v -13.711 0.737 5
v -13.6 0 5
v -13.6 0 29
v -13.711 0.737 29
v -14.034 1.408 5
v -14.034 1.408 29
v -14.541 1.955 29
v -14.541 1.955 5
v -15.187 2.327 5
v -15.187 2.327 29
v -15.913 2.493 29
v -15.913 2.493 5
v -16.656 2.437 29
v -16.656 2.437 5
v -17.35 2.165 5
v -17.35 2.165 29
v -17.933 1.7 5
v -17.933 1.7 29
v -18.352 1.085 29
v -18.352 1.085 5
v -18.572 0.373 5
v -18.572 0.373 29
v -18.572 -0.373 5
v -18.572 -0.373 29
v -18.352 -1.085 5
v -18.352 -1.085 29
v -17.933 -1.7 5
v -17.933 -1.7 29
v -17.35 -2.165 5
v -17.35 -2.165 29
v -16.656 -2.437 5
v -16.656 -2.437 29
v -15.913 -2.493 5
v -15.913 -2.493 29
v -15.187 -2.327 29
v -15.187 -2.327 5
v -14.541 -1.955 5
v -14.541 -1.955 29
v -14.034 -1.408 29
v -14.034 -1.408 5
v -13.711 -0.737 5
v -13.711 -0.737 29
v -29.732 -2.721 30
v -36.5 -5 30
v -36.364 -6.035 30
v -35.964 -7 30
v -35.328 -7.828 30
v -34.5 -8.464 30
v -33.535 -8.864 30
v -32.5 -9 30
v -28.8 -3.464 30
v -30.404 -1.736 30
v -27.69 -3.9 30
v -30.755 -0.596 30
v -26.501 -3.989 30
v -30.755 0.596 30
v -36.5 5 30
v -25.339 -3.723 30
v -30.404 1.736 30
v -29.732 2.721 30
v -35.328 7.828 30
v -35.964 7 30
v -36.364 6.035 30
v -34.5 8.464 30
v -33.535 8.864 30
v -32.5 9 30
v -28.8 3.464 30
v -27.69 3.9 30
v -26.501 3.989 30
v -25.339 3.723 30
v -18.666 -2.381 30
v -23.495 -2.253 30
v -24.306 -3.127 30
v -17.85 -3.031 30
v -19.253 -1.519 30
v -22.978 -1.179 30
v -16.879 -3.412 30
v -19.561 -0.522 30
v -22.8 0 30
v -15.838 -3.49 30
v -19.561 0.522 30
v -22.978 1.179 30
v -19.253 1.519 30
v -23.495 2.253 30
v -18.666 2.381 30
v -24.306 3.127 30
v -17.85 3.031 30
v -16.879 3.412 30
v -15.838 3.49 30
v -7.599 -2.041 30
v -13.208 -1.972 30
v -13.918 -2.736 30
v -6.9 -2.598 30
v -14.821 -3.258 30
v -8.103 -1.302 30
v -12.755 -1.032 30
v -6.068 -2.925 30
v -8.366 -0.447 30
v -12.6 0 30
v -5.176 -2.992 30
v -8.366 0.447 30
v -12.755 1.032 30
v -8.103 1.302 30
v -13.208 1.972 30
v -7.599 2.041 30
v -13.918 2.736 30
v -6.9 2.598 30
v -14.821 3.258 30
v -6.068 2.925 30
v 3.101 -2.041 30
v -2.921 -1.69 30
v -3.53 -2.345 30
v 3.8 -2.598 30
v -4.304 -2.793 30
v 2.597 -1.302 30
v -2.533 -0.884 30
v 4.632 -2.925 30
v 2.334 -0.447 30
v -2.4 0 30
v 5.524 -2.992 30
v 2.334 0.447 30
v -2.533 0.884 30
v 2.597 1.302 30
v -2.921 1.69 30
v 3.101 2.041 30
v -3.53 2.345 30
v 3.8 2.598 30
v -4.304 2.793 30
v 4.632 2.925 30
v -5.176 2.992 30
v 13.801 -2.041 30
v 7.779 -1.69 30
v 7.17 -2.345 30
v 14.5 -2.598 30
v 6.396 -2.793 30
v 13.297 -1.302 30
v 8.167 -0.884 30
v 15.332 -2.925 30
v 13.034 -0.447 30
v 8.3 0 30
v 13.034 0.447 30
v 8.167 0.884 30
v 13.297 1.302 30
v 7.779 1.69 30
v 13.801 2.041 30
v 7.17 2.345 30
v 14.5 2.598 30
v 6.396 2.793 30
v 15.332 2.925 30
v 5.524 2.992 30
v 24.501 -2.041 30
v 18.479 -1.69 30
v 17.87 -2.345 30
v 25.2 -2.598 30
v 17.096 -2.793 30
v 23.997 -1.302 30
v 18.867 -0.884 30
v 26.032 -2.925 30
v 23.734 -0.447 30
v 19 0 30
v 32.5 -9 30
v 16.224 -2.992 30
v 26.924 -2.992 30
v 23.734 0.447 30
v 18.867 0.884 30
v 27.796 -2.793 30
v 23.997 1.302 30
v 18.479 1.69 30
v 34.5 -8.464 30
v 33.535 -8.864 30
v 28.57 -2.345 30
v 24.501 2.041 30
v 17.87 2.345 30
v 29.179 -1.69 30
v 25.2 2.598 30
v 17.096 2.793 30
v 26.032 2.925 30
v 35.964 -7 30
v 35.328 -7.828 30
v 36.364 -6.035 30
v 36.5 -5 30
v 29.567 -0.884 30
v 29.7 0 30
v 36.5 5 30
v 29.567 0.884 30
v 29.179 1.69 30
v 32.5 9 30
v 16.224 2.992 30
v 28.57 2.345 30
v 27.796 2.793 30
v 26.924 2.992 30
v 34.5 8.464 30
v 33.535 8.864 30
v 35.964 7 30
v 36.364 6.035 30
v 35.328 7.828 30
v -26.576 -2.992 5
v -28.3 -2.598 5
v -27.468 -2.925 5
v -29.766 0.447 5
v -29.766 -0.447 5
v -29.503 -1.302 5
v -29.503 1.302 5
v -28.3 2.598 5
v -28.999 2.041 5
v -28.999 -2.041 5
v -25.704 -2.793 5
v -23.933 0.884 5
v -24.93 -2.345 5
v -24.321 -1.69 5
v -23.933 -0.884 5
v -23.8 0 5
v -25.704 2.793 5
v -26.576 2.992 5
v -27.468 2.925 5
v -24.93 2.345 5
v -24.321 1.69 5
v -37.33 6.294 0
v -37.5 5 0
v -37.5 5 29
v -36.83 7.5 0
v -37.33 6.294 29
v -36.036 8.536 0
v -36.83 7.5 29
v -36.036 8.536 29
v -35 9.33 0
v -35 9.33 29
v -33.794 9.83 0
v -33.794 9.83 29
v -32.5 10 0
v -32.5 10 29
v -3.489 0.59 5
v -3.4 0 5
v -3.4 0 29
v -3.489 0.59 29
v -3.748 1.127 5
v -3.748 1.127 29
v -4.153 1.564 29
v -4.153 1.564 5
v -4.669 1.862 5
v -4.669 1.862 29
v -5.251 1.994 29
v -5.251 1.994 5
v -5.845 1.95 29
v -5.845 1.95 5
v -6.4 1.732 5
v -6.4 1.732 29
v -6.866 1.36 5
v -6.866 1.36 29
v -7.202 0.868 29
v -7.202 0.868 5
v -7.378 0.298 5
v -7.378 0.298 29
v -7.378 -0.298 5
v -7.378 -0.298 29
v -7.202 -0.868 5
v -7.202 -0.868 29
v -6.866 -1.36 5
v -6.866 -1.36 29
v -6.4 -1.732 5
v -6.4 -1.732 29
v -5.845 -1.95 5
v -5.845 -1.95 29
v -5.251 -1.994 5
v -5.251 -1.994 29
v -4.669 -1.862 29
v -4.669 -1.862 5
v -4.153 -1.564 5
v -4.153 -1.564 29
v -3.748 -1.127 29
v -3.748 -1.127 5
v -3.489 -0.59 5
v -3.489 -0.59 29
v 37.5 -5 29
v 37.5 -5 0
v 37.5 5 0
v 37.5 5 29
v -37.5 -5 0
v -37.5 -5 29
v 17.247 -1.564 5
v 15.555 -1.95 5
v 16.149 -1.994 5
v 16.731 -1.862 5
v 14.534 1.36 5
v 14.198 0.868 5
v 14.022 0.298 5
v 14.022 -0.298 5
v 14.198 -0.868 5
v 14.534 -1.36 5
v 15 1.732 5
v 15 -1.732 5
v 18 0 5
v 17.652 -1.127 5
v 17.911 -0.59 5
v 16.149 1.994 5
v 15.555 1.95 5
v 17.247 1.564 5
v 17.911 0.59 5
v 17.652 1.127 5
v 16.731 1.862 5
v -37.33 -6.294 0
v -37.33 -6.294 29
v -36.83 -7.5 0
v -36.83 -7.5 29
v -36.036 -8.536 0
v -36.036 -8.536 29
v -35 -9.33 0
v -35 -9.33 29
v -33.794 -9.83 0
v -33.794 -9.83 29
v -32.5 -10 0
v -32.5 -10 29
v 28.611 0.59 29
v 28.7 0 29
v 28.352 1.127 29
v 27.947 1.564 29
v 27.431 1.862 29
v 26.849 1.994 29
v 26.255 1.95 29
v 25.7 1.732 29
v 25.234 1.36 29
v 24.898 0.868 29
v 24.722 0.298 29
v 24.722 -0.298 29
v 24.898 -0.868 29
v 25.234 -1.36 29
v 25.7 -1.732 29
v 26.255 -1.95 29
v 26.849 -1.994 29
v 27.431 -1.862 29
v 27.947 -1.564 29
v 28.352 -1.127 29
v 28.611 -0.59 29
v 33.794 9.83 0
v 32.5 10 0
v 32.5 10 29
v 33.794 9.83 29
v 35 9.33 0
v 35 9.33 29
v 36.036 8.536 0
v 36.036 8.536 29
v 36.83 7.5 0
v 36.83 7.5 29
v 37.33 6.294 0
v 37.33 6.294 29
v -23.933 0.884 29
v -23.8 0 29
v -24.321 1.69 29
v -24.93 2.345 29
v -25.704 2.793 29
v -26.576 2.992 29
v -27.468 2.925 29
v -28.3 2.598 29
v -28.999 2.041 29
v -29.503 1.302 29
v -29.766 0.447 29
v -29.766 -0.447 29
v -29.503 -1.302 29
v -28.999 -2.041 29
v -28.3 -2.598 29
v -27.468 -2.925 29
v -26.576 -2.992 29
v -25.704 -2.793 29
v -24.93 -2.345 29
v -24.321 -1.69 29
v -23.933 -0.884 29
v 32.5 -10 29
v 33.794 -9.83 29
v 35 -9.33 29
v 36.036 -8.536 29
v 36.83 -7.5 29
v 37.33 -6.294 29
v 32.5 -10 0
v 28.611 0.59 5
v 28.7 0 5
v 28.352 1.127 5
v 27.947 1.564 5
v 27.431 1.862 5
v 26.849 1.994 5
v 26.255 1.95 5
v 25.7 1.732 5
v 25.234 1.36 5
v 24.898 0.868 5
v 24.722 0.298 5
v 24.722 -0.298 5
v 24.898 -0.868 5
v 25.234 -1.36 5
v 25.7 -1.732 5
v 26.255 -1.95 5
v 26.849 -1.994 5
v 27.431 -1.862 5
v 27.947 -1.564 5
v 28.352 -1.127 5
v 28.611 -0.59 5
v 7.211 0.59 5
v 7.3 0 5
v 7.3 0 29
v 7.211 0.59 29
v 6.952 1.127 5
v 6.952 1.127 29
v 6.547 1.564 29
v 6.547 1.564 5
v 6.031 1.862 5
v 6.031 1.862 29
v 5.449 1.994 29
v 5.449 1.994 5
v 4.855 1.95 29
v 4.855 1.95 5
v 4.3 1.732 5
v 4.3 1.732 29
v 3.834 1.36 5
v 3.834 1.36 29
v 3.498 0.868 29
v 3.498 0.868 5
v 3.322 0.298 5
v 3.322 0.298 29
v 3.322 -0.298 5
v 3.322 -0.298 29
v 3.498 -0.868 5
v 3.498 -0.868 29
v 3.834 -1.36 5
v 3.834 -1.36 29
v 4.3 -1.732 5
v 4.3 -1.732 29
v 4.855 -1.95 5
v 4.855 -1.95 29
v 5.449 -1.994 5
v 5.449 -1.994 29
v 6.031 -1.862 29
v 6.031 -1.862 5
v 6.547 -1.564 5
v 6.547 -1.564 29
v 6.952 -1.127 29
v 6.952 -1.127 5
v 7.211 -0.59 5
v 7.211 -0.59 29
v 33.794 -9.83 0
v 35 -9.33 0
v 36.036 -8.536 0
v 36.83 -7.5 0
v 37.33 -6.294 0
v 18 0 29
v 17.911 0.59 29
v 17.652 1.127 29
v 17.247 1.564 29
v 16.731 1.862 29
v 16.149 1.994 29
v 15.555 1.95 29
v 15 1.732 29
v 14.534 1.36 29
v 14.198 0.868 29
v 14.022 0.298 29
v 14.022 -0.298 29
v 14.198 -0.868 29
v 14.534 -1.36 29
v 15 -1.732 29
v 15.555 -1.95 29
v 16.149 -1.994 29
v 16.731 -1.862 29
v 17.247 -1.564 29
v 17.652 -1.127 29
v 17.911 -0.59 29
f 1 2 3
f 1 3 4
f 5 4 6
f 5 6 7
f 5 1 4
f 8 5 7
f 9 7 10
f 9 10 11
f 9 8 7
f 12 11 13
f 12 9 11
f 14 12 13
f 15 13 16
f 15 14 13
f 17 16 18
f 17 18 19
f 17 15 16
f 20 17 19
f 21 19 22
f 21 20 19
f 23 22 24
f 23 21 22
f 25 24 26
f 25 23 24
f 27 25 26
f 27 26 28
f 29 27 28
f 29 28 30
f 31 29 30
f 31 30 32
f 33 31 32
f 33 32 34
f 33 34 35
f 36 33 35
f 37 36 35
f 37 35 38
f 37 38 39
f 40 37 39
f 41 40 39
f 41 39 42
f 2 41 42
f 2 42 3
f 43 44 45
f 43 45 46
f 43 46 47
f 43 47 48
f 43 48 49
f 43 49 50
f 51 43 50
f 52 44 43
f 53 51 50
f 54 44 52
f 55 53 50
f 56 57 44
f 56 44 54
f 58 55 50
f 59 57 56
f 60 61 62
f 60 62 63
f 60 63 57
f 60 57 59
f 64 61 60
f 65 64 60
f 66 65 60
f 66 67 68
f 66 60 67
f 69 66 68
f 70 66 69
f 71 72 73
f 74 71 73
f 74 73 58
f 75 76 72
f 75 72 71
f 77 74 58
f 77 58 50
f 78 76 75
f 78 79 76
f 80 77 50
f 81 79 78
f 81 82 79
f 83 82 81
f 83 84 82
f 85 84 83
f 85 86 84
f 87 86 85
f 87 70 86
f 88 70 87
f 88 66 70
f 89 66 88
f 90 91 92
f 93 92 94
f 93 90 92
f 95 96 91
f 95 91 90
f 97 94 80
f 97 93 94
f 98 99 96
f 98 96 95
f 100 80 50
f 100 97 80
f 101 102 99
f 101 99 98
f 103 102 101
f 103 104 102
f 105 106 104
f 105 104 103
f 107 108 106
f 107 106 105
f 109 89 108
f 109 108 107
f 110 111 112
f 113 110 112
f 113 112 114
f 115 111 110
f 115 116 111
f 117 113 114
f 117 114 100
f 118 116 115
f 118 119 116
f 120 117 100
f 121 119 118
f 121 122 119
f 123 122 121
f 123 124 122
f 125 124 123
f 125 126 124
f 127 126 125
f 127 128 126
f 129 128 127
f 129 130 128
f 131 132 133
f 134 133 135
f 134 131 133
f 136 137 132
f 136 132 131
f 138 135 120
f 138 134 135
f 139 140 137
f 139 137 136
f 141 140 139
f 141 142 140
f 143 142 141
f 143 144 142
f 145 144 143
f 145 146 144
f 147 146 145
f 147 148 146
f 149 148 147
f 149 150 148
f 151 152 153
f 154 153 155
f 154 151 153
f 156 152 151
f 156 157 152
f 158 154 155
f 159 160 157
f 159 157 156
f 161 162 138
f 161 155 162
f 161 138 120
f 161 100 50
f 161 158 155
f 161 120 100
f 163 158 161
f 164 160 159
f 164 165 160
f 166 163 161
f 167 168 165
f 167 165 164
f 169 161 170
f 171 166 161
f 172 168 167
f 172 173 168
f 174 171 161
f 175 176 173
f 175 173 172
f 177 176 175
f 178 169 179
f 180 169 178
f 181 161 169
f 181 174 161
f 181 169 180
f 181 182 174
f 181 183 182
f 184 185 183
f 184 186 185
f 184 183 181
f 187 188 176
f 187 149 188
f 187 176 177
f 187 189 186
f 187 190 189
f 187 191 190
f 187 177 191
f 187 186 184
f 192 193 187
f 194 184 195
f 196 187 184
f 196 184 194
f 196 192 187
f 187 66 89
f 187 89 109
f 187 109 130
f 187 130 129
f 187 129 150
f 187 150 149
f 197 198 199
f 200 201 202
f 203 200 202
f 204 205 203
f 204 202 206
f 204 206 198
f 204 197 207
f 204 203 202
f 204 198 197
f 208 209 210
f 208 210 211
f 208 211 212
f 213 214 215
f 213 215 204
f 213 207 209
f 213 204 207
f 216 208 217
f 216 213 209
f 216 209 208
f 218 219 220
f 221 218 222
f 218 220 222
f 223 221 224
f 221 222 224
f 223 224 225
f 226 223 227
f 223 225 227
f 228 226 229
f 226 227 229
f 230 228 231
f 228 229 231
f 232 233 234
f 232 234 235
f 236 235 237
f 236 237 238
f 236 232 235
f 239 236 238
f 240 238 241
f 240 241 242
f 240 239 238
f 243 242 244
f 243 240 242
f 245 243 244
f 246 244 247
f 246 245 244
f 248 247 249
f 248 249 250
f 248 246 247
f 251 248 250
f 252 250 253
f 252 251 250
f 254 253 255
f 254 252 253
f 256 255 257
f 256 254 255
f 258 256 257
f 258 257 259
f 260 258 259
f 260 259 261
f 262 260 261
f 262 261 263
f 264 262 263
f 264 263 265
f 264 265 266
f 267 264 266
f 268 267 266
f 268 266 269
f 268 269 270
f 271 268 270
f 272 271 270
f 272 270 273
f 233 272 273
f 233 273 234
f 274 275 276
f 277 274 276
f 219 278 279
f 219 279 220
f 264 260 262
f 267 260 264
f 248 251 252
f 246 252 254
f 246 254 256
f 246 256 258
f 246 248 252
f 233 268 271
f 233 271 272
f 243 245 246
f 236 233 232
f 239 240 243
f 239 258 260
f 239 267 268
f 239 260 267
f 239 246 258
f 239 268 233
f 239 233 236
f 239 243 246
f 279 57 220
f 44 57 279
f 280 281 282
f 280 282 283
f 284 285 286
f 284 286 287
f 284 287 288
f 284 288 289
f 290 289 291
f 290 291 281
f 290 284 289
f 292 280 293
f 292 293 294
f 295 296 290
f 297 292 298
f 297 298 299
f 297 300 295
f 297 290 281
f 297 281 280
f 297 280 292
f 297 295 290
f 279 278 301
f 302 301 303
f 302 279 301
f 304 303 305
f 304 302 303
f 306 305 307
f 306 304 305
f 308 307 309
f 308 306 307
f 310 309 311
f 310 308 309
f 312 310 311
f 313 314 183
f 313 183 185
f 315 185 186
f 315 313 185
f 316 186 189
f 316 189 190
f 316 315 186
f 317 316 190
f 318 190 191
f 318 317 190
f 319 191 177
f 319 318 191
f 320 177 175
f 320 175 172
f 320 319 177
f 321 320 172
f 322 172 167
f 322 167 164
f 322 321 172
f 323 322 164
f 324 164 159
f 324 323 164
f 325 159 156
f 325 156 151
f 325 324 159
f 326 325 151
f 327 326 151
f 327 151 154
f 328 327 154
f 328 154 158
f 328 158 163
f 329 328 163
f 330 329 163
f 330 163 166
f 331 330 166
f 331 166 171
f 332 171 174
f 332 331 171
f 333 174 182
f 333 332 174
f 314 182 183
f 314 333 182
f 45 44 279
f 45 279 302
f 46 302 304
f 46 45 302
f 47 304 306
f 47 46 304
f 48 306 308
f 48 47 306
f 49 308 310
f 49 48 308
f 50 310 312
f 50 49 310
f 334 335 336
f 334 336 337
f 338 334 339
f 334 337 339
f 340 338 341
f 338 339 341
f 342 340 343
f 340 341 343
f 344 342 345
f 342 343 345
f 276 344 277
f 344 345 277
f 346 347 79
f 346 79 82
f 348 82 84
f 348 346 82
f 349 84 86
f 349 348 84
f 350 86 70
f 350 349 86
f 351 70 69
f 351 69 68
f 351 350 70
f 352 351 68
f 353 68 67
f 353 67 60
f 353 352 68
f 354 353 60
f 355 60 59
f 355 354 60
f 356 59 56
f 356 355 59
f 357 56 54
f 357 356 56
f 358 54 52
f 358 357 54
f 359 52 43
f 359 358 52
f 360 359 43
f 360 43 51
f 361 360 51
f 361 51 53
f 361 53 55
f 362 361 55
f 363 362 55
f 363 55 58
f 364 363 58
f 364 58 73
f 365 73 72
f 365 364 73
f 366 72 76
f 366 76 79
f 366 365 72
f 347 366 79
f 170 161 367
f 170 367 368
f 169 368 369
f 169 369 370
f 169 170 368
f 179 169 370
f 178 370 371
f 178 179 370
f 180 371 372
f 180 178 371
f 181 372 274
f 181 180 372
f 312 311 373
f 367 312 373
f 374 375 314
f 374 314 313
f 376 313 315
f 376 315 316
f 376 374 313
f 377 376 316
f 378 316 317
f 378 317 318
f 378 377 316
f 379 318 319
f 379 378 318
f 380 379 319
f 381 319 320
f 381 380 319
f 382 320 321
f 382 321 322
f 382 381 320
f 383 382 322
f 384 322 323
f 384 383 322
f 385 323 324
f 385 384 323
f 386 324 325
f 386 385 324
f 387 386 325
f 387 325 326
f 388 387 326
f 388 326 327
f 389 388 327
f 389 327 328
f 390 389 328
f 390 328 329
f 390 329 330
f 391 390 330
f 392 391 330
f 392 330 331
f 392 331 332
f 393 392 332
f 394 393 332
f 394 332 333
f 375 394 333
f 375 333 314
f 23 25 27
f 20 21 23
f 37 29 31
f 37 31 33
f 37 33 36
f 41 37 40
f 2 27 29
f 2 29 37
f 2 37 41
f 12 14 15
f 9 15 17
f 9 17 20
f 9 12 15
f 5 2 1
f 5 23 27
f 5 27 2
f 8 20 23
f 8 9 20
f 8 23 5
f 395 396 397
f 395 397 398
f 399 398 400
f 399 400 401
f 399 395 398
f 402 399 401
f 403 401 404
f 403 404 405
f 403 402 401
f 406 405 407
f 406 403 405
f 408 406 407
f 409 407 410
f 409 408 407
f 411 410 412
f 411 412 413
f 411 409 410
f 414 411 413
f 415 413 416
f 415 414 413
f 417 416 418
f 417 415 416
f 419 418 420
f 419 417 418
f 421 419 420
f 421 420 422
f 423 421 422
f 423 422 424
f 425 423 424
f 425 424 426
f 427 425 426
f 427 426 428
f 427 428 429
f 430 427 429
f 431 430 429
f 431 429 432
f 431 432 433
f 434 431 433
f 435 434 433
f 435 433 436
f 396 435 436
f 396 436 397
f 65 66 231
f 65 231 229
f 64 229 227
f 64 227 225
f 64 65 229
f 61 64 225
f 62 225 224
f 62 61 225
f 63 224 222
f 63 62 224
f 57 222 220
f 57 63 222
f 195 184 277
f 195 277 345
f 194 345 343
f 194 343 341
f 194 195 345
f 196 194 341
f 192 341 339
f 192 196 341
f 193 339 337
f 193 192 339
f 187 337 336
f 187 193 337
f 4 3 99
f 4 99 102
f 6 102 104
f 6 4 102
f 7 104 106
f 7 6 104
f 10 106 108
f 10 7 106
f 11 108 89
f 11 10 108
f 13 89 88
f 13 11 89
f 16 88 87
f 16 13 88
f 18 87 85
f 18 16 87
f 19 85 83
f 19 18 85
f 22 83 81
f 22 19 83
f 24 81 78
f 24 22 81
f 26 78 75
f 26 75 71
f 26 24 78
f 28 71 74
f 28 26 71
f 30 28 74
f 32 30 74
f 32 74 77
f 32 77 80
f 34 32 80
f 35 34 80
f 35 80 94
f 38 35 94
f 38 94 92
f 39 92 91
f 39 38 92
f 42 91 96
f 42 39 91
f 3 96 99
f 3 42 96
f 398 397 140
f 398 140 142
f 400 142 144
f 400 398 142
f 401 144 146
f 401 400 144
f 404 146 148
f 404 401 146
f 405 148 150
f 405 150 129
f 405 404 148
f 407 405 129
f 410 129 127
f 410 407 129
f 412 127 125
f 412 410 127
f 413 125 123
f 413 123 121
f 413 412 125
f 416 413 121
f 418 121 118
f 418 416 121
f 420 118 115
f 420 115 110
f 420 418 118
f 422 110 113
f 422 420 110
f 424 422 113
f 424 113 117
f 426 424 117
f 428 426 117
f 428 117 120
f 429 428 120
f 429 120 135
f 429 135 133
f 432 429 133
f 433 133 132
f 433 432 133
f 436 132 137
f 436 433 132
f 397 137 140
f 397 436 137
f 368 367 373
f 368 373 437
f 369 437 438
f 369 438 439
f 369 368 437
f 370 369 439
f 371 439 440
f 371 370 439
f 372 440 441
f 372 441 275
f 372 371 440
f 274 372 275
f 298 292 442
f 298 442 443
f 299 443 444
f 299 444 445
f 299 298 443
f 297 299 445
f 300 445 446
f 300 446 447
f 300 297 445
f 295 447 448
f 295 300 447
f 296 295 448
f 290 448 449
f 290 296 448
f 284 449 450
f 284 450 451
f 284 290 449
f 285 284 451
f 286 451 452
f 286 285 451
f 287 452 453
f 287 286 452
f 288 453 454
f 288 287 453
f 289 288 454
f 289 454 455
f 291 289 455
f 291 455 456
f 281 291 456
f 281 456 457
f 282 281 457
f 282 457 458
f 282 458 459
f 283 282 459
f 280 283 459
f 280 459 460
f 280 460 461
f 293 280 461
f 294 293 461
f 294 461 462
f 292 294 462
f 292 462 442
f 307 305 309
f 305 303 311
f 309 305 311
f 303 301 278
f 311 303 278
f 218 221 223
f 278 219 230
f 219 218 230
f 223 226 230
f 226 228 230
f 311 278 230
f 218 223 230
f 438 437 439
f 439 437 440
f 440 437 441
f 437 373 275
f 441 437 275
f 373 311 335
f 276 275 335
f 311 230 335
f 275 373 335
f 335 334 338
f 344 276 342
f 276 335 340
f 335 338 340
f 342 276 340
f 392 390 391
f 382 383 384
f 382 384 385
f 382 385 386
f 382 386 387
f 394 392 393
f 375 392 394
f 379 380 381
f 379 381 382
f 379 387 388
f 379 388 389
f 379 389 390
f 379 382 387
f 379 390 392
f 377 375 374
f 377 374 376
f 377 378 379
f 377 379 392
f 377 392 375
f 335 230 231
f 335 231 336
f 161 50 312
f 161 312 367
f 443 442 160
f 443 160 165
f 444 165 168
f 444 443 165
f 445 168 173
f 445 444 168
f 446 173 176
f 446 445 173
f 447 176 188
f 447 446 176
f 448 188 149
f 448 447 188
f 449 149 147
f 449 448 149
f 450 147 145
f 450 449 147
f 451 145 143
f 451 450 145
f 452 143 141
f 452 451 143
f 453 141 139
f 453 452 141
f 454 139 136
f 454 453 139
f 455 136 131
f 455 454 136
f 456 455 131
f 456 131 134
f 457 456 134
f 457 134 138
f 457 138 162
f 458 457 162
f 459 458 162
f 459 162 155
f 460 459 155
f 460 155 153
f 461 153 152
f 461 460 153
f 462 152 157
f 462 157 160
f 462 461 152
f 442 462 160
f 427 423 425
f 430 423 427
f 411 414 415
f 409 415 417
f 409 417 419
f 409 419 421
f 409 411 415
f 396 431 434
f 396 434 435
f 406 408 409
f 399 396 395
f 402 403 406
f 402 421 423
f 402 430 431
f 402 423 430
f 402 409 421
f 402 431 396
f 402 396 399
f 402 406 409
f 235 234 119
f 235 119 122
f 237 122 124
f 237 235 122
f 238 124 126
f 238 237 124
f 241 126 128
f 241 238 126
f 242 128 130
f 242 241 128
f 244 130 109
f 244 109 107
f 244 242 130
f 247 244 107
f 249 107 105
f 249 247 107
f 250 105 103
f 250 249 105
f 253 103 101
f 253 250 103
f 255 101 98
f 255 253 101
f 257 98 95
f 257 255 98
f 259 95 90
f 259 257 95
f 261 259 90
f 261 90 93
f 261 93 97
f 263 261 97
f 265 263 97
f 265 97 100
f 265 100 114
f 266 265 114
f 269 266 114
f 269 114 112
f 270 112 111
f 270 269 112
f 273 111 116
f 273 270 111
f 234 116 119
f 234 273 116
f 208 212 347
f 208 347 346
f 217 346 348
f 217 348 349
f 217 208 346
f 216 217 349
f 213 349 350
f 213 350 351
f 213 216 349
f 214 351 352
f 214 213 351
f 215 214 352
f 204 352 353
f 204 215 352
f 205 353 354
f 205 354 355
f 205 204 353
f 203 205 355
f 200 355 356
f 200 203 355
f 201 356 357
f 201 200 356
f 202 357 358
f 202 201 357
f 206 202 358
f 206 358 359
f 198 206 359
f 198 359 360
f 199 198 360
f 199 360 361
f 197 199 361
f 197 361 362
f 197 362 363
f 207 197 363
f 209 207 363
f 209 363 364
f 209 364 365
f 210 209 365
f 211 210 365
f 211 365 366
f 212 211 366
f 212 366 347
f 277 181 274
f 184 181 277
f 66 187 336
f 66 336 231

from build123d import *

# Parameters (mm, degrees)
F0_W     = 75
F0_H     = 20
F0_R     = 3
F0_R_2   = 2.5
F0_R_3   = 2
F1_DEPTH = 30
F2_DEPTH = 5
F3_R     = 5
F4_SIZE  = 1


with BuildPart() as f1:
    # F0 (on Top) → F1 (new body)
    with BuildSketch(Plane.XY):
        Rectangle(F0_W, F0_H)
        with Locations((-26.8, 0)):
            Circle(F0_R, mode=Mode.SUBTRACT)
        with Locations((-16.1, 0)):
            Circle(F0_R_2, mode=Mode.SUBTRACT)
        with Locations((-5.4, 0)):
            Circle(F0_R_3, mode=Mode.SUBTRACT)
        with Locations((5.3, 0)):
            Circle(F0_R_3, mode=Mode.SUBTRACT)
        with Locations((16, 0)):
            Circle(F0_R_3, mode=Mode.SUBTRACT)
        with Locations((26.7, 0)):
            Circle(F0_R_3, mode=Mode.SUBTRACT)
    extrude(amount=F1_DEPTH)

    # F0 (on Top) → F2 (join)
    with BuildSketch(Plane.XY):
        with Locations((-26.8, 0)):
            Circle(F0_R)
        with Locations((-16.1, 0)):
            Circle(F0_R_2)
        with Locations((-5.4, 0)):
            Circle(F0_R_3)
        with Locations((5.3, 0)):
            Circle(F0_R_3)
        with Locations((16, 0)):
            Circle(F0_R_3)
        with Locations((26.7, 0)):
            Circle(F0_R_3)
    extrude(amount=F2_DEPTH)

    # F3
    f3_edges = [f1.edges().sort_by_distance(p)[0] for p in [
        (37.5, -10, 15),
        (37.5, 10, 15),
        (-37.5, -10, 15),
        (-37.5, 10, 15),
    ]]
    fillet(f3_edges, radius=F3_R)

    # F4
    f4_edges = [f1.edges().sort_by_distance(p)[0] for p in [
        (-29.8, 0, 30),
        (-18.6, 0, 30),
        (-7.4, 0, 30),
        (3.3, 0, 30),
        (14, 0, 30),
        (24.7, 0, 30),
        (0, -10, 30),
    ]]
    chamfer(f4_edges, length=F4_SIZE)


solid = f1.part
